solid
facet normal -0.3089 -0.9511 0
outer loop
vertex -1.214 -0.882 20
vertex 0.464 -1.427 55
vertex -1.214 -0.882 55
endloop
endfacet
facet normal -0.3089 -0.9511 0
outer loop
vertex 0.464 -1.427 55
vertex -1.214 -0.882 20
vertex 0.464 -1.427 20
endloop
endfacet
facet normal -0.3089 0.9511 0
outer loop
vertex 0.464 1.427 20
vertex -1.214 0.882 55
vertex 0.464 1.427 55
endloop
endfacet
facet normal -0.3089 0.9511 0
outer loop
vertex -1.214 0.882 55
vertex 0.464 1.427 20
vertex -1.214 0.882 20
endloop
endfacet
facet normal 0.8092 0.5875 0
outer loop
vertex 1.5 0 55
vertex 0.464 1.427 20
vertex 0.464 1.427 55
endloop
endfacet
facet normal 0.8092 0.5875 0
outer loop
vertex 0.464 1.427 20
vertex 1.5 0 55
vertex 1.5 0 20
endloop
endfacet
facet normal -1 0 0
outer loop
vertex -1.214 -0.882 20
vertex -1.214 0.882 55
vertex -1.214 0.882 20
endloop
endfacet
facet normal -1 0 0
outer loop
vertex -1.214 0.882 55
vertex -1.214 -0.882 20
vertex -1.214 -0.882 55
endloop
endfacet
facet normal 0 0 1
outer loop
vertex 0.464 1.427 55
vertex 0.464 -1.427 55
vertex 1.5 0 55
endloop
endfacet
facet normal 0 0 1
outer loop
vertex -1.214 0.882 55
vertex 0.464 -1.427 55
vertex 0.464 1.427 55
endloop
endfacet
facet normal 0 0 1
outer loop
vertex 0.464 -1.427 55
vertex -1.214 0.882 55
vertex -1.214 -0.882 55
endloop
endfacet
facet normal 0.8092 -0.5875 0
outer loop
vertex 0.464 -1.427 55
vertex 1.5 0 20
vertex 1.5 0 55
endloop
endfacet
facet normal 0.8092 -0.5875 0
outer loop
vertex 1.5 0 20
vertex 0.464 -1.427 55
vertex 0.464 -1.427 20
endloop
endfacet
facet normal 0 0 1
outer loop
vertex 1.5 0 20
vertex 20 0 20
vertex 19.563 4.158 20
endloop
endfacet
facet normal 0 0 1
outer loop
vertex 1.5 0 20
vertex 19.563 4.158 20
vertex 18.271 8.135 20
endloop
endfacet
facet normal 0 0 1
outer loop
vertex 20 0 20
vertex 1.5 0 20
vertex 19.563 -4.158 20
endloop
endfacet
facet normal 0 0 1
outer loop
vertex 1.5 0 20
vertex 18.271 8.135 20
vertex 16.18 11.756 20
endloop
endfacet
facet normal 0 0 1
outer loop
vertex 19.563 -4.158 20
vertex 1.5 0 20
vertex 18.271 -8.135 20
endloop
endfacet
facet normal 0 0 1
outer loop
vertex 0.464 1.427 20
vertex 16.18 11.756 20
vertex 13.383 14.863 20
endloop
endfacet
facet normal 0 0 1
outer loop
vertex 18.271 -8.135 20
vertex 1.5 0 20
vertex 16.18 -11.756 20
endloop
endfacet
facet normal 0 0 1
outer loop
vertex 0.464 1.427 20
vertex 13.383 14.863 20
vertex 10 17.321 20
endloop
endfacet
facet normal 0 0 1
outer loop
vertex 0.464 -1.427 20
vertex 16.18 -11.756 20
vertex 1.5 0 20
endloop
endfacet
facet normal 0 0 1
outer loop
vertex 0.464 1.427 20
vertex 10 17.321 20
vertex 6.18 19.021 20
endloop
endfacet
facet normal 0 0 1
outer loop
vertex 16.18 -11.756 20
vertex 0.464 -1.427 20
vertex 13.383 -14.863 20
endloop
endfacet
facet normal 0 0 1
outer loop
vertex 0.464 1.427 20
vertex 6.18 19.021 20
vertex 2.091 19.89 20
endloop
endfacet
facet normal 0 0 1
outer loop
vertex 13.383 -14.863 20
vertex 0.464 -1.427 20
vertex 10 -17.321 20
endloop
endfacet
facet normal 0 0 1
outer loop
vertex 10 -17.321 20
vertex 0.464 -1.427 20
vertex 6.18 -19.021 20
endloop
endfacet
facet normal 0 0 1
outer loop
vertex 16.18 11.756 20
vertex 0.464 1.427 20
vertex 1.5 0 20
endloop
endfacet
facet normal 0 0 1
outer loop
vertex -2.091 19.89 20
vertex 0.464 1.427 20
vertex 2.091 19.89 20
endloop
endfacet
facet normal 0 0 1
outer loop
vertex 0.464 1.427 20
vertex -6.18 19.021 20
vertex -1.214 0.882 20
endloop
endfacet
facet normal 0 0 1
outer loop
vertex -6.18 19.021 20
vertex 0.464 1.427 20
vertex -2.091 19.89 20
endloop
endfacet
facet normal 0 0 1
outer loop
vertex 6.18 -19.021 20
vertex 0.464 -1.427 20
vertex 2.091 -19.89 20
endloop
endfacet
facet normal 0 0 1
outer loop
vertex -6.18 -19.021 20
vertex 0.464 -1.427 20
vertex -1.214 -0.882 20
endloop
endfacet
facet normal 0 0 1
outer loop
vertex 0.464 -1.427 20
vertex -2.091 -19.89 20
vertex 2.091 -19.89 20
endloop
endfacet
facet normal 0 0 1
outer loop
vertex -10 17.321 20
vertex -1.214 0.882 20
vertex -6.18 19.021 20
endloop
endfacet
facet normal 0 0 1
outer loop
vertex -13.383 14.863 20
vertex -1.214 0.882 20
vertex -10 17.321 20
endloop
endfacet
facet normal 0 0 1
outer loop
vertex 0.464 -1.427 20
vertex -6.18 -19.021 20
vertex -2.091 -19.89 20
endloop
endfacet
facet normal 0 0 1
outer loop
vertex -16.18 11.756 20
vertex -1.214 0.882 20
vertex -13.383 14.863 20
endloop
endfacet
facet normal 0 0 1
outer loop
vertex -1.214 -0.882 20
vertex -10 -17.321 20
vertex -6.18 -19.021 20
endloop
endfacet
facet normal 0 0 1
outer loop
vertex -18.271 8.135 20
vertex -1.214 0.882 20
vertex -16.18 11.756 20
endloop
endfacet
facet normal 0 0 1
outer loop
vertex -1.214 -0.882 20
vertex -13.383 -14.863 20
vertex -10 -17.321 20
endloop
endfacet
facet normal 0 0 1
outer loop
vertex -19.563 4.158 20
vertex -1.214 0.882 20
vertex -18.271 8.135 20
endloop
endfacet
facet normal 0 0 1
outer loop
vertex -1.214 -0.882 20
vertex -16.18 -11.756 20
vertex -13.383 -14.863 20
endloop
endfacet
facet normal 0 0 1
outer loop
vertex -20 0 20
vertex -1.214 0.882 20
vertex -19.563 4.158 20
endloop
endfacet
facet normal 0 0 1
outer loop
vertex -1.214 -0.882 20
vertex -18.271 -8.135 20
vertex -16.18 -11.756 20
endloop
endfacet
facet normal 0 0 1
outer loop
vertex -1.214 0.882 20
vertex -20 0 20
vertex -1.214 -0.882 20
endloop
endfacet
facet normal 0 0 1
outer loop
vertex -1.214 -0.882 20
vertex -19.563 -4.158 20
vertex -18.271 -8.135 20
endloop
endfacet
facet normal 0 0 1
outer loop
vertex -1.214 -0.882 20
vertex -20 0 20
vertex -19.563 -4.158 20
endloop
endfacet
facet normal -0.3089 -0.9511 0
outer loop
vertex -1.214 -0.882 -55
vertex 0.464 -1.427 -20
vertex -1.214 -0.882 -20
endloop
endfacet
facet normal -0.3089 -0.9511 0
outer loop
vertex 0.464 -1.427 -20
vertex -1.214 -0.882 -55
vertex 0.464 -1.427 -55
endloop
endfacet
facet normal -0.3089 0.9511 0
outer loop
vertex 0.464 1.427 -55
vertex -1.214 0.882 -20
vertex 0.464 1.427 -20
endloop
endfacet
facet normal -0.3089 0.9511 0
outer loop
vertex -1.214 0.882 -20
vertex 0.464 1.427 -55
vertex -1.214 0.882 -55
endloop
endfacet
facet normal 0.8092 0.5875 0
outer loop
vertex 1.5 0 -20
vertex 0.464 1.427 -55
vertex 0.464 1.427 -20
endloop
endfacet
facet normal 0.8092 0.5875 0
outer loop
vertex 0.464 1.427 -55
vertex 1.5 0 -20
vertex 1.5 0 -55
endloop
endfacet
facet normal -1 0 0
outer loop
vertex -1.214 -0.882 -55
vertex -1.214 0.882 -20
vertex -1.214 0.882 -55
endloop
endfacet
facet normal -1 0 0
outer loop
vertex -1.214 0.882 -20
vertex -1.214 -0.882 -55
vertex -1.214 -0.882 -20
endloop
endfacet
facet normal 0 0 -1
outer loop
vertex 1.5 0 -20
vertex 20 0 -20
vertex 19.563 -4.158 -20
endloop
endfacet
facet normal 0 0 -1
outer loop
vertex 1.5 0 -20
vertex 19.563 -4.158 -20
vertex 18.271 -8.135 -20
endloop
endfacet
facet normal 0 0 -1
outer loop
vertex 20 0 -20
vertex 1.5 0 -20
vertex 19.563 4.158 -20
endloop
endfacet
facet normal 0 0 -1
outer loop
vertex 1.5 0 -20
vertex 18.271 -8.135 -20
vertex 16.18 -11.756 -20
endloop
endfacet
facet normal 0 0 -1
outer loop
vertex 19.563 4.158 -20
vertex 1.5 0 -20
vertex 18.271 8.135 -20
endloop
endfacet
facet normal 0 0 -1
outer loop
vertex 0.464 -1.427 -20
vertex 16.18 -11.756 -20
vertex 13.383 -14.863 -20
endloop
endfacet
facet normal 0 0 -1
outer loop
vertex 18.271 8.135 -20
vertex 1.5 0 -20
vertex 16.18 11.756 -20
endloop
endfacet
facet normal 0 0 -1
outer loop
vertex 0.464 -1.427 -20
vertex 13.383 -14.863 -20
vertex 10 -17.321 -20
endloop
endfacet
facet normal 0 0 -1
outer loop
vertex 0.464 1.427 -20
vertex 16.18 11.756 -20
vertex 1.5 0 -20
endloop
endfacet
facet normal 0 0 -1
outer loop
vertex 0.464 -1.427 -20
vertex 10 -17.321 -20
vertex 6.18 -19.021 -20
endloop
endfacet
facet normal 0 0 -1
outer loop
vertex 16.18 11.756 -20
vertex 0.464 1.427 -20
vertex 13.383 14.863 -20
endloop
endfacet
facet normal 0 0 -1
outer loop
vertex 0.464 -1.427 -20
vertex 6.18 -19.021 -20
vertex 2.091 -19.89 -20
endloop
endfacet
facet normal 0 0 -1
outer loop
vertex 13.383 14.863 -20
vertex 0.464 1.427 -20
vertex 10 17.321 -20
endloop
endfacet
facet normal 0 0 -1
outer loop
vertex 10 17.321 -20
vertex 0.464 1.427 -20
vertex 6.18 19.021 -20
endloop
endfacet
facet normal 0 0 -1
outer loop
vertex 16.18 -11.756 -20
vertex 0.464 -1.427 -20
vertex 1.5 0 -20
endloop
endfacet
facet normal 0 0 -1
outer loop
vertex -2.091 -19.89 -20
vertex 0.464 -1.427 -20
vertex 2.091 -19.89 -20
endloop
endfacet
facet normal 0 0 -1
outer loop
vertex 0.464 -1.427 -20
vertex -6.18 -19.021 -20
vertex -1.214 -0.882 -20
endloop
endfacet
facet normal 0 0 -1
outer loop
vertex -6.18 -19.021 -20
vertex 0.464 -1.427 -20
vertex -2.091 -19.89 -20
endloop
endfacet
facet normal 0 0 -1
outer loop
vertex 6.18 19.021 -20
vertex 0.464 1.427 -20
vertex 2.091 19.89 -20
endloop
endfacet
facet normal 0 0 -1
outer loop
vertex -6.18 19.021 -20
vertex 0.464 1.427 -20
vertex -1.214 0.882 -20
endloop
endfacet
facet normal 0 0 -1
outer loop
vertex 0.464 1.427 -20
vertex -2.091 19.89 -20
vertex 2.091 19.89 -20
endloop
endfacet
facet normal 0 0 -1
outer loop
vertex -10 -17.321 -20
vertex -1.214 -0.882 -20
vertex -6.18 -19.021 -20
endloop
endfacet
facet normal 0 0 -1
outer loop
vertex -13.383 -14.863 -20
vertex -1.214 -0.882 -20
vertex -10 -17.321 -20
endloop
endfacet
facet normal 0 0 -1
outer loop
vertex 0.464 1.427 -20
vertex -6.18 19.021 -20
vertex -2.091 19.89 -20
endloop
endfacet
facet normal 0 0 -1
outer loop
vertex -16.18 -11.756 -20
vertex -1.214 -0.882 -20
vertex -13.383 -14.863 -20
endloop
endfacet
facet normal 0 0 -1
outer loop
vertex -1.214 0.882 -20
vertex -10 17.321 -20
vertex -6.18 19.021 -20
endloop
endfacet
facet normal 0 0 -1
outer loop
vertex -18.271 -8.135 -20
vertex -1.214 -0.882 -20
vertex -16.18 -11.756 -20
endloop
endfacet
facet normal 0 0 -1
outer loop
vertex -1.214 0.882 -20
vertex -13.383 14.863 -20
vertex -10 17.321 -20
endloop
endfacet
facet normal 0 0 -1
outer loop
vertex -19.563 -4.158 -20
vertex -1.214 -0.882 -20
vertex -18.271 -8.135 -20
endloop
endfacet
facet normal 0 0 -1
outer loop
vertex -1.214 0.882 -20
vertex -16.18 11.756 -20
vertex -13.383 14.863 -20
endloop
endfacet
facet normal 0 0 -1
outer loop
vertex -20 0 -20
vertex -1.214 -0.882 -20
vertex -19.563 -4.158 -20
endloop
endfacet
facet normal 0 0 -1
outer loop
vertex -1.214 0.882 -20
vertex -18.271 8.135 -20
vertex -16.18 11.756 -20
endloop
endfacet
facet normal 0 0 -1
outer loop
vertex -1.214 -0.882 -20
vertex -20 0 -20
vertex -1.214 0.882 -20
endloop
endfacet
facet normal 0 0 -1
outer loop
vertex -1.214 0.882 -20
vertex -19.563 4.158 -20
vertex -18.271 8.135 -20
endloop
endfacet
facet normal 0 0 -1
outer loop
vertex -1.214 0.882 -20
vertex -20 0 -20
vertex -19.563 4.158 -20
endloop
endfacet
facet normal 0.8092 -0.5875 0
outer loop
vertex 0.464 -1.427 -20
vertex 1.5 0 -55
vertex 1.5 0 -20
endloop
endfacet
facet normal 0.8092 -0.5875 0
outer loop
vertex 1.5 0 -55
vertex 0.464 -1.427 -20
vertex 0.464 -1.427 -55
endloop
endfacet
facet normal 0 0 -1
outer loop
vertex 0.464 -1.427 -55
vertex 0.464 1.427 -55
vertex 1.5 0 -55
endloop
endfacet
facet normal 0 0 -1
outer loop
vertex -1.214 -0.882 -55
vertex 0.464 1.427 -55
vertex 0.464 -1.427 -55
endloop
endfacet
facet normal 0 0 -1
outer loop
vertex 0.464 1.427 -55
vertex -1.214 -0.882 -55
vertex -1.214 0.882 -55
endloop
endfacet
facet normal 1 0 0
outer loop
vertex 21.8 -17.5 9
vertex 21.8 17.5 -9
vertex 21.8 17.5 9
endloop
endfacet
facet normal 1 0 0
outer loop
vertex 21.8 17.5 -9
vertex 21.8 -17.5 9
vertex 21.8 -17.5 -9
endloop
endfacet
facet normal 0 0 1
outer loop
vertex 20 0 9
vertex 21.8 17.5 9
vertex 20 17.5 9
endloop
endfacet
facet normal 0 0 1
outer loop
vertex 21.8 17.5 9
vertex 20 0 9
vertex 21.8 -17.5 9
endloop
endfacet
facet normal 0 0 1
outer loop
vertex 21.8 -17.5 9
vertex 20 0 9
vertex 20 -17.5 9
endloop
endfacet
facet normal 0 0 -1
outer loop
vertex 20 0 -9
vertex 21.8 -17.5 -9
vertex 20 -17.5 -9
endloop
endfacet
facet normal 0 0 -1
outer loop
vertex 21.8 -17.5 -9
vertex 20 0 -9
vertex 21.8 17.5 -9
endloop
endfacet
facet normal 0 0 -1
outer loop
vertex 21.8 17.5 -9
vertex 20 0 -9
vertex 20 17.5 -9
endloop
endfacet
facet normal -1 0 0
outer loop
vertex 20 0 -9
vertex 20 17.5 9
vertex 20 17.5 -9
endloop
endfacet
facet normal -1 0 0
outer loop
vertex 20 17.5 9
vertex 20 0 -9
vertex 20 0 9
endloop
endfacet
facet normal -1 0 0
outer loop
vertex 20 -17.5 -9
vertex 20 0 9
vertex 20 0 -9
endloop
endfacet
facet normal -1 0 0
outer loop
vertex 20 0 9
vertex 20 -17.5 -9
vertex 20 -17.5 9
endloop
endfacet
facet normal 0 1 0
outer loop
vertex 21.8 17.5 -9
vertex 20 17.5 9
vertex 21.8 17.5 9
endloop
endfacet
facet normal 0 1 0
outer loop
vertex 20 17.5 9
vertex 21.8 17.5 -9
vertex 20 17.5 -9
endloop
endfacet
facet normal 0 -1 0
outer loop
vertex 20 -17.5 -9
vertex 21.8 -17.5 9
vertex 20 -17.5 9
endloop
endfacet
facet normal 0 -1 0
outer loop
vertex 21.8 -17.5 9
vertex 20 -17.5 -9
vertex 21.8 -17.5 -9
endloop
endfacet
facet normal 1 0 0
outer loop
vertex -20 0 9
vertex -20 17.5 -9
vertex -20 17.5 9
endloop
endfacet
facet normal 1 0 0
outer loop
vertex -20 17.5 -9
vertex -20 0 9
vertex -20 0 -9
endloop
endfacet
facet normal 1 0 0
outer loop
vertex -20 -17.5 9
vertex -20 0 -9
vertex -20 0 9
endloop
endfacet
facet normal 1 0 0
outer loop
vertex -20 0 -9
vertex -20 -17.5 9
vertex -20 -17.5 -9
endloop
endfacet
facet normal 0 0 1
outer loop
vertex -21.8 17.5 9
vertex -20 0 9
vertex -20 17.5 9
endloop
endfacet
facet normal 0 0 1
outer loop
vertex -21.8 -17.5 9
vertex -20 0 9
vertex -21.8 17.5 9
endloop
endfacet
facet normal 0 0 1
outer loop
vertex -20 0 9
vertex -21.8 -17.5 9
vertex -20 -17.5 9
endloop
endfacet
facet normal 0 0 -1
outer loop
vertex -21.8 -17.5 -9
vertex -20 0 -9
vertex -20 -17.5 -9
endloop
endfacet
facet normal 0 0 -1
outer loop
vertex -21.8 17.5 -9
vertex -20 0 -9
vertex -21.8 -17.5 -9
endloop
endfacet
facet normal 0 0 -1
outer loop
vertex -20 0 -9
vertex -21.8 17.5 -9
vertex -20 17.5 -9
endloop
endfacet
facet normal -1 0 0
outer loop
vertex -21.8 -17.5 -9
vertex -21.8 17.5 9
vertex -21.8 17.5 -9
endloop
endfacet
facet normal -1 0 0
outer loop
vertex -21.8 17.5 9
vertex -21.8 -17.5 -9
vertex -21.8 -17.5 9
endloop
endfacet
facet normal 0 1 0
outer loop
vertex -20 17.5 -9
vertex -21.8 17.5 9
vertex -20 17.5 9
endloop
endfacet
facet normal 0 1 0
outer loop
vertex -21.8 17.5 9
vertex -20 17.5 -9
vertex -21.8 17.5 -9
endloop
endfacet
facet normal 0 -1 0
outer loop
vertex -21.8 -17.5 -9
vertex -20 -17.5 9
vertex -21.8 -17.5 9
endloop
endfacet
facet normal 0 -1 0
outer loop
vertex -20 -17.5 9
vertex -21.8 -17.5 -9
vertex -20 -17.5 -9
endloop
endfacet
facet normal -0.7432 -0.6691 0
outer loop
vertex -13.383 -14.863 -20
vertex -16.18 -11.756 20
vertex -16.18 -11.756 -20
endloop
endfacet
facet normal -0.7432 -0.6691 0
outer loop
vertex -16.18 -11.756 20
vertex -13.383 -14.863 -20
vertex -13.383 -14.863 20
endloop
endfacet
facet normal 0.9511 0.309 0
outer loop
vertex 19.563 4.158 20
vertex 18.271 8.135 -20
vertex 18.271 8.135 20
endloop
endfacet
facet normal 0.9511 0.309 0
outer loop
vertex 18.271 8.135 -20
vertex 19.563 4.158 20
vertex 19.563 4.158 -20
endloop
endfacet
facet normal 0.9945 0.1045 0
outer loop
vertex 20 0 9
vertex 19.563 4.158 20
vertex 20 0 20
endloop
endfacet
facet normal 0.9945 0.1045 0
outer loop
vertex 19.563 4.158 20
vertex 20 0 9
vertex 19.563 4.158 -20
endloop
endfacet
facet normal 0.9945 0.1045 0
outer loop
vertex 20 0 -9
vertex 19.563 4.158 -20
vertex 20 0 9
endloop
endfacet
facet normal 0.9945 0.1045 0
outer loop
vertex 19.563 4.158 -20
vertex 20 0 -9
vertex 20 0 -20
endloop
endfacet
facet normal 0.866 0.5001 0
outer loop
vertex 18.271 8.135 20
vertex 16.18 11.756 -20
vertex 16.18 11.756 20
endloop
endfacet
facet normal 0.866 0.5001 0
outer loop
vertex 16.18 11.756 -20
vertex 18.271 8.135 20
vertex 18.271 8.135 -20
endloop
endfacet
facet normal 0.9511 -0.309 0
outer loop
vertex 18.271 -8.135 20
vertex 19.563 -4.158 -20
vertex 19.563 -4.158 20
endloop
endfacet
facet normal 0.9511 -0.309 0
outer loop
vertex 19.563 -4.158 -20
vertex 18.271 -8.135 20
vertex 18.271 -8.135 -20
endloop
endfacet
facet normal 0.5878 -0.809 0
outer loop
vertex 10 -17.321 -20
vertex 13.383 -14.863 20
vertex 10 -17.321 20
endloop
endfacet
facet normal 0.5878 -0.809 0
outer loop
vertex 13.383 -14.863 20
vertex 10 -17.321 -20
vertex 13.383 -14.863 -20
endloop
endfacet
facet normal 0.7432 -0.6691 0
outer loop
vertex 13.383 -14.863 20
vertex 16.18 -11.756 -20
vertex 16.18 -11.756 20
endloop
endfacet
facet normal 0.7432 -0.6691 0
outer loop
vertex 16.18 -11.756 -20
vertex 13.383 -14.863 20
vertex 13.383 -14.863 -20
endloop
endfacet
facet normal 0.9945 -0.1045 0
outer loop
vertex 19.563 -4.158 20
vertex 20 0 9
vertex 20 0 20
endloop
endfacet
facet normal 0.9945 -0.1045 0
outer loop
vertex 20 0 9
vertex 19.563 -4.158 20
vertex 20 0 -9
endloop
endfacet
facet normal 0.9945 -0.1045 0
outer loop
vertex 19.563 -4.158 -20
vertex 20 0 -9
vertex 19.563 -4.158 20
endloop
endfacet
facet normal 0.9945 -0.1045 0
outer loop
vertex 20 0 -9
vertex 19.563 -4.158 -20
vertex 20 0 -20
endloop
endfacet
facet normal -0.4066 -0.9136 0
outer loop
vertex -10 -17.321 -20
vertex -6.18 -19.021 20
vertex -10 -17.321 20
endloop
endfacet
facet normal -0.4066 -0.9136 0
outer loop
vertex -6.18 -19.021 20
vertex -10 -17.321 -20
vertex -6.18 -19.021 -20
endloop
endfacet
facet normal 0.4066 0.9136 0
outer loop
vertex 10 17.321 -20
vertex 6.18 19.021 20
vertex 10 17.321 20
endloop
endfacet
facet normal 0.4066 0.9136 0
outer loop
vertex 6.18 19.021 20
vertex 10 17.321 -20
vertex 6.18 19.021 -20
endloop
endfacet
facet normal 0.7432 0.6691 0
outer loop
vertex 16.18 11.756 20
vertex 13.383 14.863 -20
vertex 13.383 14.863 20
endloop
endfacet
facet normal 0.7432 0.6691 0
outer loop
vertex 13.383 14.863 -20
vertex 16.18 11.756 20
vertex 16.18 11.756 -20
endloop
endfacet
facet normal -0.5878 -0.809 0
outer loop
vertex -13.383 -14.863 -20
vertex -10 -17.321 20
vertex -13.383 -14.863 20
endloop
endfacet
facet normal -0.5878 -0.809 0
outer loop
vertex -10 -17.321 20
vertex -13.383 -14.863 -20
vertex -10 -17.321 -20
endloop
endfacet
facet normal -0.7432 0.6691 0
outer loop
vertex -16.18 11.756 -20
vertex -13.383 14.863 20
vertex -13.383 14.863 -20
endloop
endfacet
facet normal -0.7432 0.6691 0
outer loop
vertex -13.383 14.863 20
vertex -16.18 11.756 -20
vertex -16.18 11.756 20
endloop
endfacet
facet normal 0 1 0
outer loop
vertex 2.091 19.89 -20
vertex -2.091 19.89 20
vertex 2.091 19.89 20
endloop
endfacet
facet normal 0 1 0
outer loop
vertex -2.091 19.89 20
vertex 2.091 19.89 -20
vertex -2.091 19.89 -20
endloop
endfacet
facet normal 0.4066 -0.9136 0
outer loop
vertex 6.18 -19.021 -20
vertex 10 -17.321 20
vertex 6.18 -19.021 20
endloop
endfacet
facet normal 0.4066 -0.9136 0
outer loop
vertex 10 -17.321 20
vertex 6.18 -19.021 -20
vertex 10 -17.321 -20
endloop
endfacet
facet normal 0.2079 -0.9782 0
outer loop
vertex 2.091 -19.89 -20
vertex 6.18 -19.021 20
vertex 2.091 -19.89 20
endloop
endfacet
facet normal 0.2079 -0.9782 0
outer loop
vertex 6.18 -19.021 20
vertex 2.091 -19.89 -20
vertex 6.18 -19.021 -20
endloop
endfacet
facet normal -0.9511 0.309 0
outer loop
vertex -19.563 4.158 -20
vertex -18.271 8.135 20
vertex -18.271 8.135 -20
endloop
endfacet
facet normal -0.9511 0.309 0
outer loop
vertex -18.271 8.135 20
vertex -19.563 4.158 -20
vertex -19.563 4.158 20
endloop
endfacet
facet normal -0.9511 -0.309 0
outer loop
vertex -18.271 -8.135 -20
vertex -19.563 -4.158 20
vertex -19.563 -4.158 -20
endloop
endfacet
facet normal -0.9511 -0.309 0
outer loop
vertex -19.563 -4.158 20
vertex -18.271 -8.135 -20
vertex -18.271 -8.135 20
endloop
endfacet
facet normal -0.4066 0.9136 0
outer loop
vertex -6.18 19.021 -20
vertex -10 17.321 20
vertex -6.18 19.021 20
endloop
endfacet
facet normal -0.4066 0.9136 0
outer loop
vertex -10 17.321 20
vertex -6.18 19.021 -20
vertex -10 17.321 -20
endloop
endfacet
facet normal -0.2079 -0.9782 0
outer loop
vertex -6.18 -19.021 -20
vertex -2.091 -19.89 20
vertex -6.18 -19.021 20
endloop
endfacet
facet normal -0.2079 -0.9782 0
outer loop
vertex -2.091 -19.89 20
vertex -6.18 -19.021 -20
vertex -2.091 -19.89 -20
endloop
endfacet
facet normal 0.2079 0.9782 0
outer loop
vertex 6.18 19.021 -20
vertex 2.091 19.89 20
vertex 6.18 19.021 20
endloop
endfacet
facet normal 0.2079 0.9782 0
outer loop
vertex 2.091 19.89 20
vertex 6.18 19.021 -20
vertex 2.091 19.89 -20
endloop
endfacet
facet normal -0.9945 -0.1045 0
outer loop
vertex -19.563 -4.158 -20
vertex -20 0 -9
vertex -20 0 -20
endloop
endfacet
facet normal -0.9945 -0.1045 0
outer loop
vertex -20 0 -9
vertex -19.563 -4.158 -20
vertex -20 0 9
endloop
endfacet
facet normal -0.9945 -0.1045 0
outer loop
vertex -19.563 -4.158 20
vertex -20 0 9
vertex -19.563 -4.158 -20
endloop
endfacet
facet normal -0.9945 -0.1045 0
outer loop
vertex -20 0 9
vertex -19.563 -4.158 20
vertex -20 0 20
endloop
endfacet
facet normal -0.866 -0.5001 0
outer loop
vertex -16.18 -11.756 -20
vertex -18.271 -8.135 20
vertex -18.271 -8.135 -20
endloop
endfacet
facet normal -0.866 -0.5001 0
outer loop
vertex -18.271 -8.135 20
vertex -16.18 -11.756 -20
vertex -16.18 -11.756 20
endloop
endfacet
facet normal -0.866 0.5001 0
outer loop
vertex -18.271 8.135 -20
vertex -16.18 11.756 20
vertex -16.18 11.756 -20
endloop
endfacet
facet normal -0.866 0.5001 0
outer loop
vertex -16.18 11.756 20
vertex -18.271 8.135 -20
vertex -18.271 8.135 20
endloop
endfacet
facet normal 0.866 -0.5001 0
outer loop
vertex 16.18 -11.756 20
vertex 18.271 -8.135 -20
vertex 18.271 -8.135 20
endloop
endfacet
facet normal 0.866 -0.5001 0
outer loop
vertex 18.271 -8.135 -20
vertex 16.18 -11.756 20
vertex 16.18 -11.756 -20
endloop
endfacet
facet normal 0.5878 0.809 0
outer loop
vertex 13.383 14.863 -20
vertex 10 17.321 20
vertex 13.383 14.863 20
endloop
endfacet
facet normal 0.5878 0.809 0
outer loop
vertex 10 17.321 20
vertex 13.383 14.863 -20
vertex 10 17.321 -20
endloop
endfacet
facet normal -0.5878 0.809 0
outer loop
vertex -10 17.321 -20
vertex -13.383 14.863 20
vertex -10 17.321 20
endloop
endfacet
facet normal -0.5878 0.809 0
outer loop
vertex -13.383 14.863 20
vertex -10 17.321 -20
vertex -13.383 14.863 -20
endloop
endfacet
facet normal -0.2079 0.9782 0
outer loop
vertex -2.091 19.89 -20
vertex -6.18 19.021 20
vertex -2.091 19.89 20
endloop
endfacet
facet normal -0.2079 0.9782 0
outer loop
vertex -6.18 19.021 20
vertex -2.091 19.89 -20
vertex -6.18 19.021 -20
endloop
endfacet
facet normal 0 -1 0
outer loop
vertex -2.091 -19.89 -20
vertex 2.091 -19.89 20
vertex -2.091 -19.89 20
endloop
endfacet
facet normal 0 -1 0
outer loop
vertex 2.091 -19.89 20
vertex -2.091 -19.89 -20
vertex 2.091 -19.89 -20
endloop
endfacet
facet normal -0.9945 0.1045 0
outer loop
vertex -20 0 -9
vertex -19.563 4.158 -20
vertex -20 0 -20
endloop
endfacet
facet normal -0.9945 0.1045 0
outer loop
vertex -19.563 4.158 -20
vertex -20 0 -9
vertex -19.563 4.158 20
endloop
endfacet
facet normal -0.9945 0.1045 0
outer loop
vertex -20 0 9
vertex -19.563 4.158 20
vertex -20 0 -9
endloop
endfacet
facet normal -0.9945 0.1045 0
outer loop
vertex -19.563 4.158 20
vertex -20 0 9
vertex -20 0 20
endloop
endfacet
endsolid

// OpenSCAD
// =======================================================
// Satélite Compacto - Estilo basado en tu código original
// Autor: Víctor Alonso García
// Fecha: 2025-08-09
// =======================================================

// --- Parámetros principales ---
body_radius = 20;          // Radio del cuerpo central
body_height = 40;          // Altura del cuerpo
antenna_length = 35;       // Longitud de la antena
antenna_radius = 1.5;      // Grosor de la antena
panel_width = 35;          // Ancho del panel solar
panel_height = 18;         // Alto del panel solar
panel_thickness = 1.8;     // Grosor del panel solar

// =======================================================
// Módulo principal
// =======================================================
module satellite_compact() {
    union() {
        body();
        antennas();
        solar_panels();
    }
}

// =======================================================
// Cuerpo central
// =======================================================
module body() {
    color("silver")
    cylinder(h = body_height, r = body_radius, center = true);
}

// =======================================================
// Antenas (superior e inferior)
// =======================================================
module antennas() {
    color("gray")
    union() {
        translate([0,0,body_height/2])
            cylinder(h = antenna_length, r = antenna_radius, center = false);

        translate([0,0,-(body_height/2 + antenna_length)])
            cylinder(h = antenna_length, r = antenna_radius, center = false);
    }
}

// =======================================================
// Paneles solares (izquierda y derecha)
// =======================================================
module solar_panels() {
    color("blue")
    union() {
        translate([body_radius + panel_thickness/2, 0, 0])
            cube([panel_thickness, panel_width, panel_height], center = true);

        translate([-body_radius - panel_thickness/2, 0, 0])
            cube([panel_thickness, panel_width, panel_height], center = true);
    }
}

// =======================================================
// Llamada al modelo
// =======================================================
satellite_compact();
